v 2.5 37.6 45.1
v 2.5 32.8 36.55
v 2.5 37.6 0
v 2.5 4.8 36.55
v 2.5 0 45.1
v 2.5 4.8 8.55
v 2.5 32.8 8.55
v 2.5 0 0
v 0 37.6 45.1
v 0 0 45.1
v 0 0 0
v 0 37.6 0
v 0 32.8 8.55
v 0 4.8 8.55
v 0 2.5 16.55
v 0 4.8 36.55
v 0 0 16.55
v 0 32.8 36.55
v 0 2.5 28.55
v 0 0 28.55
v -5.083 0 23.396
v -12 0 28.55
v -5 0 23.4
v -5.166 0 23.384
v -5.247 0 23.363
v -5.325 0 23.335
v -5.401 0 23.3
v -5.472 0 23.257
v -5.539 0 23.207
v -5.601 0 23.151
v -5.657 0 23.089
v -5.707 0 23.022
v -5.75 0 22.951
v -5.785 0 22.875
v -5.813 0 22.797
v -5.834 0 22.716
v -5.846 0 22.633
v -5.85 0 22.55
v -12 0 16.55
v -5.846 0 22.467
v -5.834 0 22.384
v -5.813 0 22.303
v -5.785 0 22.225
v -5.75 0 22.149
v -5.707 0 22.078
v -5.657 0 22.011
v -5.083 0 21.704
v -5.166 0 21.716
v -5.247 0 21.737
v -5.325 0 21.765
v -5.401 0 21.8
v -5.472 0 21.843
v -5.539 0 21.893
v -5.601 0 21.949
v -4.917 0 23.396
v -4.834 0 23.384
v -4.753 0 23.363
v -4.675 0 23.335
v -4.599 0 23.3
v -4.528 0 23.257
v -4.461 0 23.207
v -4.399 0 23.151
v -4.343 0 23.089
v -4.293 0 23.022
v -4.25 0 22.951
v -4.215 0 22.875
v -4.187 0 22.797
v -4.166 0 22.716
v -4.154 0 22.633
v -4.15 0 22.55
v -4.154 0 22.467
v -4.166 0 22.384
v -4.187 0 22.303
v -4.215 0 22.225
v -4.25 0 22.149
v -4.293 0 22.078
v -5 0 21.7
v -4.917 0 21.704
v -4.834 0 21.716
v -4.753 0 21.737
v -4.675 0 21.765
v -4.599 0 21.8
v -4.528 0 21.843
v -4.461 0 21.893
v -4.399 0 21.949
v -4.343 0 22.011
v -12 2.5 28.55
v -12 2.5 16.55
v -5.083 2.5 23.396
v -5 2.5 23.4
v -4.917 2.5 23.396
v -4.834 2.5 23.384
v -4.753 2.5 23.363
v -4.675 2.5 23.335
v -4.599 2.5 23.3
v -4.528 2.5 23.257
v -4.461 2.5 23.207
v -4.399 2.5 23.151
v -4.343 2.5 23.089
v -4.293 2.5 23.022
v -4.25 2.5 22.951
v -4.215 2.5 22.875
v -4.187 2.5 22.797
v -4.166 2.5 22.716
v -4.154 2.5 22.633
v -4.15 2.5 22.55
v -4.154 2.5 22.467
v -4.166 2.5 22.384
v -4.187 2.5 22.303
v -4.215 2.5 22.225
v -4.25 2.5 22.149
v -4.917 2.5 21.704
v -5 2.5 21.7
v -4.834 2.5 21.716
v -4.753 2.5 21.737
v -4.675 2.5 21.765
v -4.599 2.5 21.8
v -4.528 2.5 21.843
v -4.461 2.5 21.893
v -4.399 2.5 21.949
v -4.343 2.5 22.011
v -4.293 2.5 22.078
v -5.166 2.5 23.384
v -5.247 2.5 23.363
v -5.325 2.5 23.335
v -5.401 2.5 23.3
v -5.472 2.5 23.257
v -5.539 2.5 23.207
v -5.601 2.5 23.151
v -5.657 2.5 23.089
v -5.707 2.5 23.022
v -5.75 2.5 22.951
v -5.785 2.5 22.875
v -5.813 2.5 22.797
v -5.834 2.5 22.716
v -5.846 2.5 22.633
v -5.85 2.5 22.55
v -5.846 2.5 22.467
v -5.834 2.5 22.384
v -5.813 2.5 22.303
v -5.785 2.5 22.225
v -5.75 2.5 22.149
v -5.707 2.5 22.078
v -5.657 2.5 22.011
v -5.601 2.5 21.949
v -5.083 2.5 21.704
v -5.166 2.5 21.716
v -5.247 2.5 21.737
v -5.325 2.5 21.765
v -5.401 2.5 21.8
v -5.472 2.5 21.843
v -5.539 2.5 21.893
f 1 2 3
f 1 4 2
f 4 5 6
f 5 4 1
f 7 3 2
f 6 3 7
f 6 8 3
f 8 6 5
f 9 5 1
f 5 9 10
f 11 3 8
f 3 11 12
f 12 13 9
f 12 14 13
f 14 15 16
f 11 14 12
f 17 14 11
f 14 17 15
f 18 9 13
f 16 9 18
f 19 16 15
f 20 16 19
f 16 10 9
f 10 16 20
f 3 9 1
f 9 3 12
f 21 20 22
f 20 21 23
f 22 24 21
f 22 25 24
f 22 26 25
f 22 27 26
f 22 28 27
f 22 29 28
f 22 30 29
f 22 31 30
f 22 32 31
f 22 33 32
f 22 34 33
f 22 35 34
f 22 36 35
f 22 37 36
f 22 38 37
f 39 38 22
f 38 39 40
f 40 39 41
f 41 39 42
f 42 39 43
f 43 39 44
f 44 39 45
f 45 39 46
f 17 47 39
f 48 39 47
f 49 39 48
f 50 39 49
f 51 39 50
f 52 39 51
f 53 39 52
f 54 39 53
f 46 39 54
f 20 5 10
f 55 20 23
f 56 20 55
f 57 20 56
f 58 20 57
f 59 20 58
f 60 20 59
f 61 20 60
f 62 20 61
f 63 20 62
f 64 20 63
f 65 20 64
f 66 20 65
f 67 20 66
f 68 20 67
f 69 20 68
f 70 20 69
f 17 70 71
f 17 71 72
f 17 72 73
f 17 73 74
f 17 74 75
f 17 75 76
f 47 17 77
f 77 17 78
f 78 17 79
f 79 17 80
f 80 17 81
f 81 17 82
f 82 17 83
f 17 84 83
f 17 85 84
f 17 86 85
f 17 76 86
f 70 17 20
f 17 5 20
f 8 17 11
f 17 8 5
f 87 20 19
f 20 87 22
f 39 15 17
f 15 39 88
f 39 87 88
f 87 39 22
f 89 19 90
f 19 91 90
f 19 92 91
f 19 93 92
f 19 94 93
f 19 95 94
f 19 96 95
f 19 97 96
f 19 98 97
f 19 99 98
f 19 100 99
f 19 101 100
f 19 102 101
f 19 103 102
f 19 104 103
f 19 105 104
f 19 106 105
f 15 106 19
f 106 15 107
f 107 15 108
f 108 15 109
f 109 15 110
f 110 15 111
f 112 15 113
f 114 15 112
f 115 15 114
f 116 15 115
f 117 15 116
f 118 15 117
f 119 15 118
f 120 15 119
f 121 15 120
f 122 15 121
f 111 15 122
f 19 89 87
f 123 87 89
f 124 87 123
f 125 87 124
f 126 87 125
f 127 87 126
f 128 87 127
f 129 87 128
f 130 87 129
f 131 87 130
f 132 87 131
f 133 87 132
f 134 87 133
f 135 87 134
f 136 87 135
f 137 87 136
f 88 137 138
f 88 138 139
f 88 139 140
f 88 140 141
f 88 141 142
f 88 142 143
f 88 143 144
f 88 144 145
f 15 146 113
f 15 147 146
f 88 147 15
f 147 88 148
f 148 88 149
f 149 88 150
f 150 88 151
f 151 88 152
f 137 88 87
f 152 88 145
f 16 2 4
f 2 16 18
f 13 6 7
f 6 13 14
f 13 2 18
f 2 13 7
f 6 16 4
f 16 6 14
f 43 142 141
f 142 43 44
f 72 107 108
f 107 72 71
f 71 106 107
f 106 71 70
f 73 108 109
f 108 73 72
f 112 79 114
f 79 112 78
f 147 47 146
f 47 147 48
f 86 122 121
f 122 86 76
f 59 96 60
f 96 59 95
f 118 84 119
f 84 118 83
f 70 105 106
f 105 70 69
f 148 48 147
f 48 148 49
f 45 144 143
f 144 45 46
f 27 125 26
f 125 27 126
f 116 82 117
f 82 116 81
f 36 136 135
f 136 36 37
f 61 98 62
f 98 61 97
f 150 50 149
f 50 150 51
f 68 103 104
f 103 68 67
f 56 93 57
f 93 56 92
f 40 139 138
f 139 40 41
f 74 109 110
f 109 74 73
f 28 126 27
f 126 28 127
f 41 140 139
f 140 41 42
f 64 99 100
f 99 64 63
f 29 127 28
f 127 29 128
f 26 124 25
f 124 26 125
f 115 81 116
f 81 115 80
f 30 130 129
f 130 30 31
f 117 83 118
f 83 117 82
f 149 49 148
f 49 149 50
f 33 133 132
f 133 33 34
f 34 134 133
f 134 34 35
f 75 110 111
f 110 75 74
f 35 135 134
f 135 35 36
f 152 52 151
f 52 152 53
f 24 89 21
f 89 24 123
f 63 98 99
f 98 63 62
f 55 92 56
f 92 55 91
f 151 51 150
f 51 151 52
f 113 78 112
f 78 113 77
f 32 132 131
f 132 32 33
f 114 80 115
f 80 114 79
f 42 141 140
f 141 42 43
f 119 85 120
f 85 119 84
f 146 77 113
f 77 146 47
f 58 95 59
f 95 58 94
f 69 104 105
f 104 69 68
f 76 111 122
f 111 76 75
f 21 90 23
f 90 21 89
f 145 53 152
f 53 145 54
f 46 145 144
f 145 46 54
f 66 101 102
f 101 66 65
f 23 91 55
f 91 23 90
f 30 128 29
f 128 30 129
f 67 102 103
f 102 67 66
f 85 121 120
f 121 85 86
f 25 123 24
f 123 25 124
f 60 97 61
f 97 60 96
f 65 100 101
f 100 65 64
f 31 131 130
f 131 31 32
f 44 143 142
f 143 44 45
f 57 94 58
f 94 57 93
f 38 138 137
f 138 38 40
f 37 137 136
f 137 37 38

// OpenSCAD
// file: lib.scad
// Small helpers shared by the parts.

module rounded_square(w, h, r) {
  r2 = min(r, w / 2 - 0.01, h / 2 - 0.01);
  offset(r = r2) square([w - 2 * r2, h - 2 * r2], center = true);
}

// A plate in the x-z plane between y = y0 and y = y0 + t, from a 2D shape drawn in (x, z).
module xz_plate(y0, t) {
  translate([0, y0 + t, 0]) rotate([90, 0, 0]) linear_extrude(t) children();
}

// A plate in the y-z plane between x = x0 and x = x0 + t, from a 2D shape drawn in (y, z).
module yz_plate(x0, t) {
  translate([x0, 0, 0]) rotate([90, 0, 90]) linear_extrude(t) children();
}

// A round hole along x whose top is pointed (45 degrees, cut flat 1 mm above the circle) toward
// +dir so it prints without supports when that axis points up: dir = "y" or "z".
module teardrop_x(d, len, dir = "y") {
  rotate([0, 90, 0]) linear_extrude(len, center = true)
    rotate([0, 0, dir == "y" ? 90 : 0])  // 2D +x below ends up along +dir
      intersection() {
        union() {
          circle(d = d);
          rotate([0, 0, -45]) square(d / 2); // the point, toward 2D +x
        }
        translate([-d, -d]) square([2 * d, 2 * d]);
        translate([-d, -d]) square([d / 2 + 1 + d, 2 * d]);
      }
}
// file: params.scad
// Shared dimensions for the DIY "Reality is yours" glasses. Everything is in mm.
// Wearer coordinates: x = to the wearer's right (+), y = forward toward the world (+), z = up (+).
// The frame front sits between y = 0 (back face, toward the eyes) and y = frame_t; the eyes are
// ~14 mm behind y = 0; the right eye's axis is the line x = ipd/2, z = 0.
//
// Measure your own parts and change these before printing. The ones you should check are marked
// MEASURE; the rest are design choices.

$fn = 64;
clear = 0.3;          // fit clearance for parts that slide into each other (tune for your printer)
m2_hole = 2.2;        // through hole for an M2 screw
m2_tap = 1.7;         // hole an M2 screw self-taps into (plastic)

// ---- face ----
ipd = 63;             // MEASURE: your pupil distance (a ruler in a mirror, or an optician's number)
frame_half_w = 71;    // half the frame width; the temples sit at +-frame_half_w (MEASURE: head width / 2 at the temples, minus 2)
frame_t = 5;          // frame thickness (front to back)

// ---- rims (open; no lenses) ----
rim_w = 40;           // opening width
rim_h = 32;           // opening height
rim_cx = ipd / 2 + 4; // rim center (x): a little outboard of the pupil, as in ordinary glasses
rim_bar = 4.5;        // rim border width
rim_r = 8;            // opening corner radius
rim_outer_w = rim_w + 2 * rim_bar;
rim_outer_h = rim_h + 2 * rim_bar;
bridge_gap = 2 * rim_cx - rim_outer_w;  // space between the rims at the nose (the bridge spans it)
nose_top_w = 16;      // nose notch width at its top (z = nose_top_z)
nose_top_z = 2;
nose_bot_w = 26;      // and at the bottom edge of the frame

// ---- nose pads (printed on the back of the frame) ----
pad_depth = 9;        // how far the pads reach back toward the face
pad_z = -12;          // pad height relative to the eye line

// ---- temples ----
temple_t = 4;         // thickness (x)
temple_h = 10;        // height (z) at the front
temple_z = 8;         // temple centerline height (z)
temple_len = 112;     // straight part, from the frame back face to the ear (MEASURE: frame to the top of your ear)
temple_drop_len = 34; // part that bends down behind the ear
temple_drop_deg = 32;
joint_len = 14;       // how far the frame's joint block reaches back
joint_w = 5;          // joint block width (x)
joint_holes_y = [-4.5, -10.5]; // M2 screw positions along the joint (y)

// ---- wire channel (battery on the left temple -> electronics on the right) ----
wire_w = 2.6;
wire_d = 2;

// ---- optics: OLED -> lens -> 45 degree beam splitter -> right eye ----
// The display faces the nose (-x) on the outer side of the right eye; the splitter in front of the
// eye reflects it back toward the eye (-y) while the world shows through it. One reflection mirrors
// the picture left-right: the firmware flips it (MIRROR_X in config.h).
lens_d = 25;              // MEASURE: lens diameter (Google Cardboard lenses are 25 mm, f ~45 mm)
split_y = frame_t + 2 + lens_d / 2 + 1.5; // optical axis (y): splitter center, lens center, display center
split_w = 25.4;           // MEASURE: beam splitter plate width (the 45 degree side)
split_h = 25.4;           // MEASURE: plate height
split_t = 1.1;            // MEASURE: plate thickness
lens_f = 45;              // MEASURE: lens focal length
lens_edge = 3.5;          // MEASURE: lens edge thickness
lens_gap = 14;            // splitter center -> lens center (x)
// Display -> lens distance: a bit under the focal length puts the picture ~1 m away. The display
// carrier slides +-6 mm around this for focusing.
disp_dist = lens_f * 1000 / (lens_f + 1000);
disp_pcb_w = 44.5;        // MEASURE: display module PCB width (horizontal, along y)
disp_pcb_h = 37.0;        // MEASURE: display module PCB height (z)
disp_pcb_t = 1.6;
disp_active = 27.0;       // MEASURE: visible area (square, 1.5" 128x128 SSD1351)
disp_active_dy = 0;       // MEASURE: visible area center offset from the PCB center (y)
disp_active_dz = 0;       // MEASURE: visible area center offset from the PCB center (z)
disp_parts_t = 5;         // MEASURE: tallest part on the back of the display PCB (pin header etc.)

// ---- lens housing (in front of the right eye; screws to the frame front) ----
wall = 2;
house_x0 = ipd / 2 - split_w / (2 * sqrt(2)) - 2.5 - wall; // nose-side wall
lens_x = ipd / 2 + lens_gap;                     // lens center (x)
house_y0 = frame_t;                              // sits on the frame front
house_y1 = split_y + max(split_w / (2 * sqrt(2)) + 3, lens_d / 2 + 3.4); // front edge
house_hz = rim_outer_h / 2;                      // half height (z), same as the rims
join_x = frame_half_w + 2;                       // where the lens housing meets the display box
lens_plate_t = lens_edge + 3;                    // lens plate thickness (x): 1.5 mm lip + lens + 1.5 mm ring
light_hole = 28;                                 // square light opening between housing and display box
// Frame screw positions (x, z) for the lens housing, clear of the light path (|z| > 14 there).
housing_holes = [[frame_half_w - 2.5, 15.5], [frame_half_w - 5, -18], [lens_x, -rim_outer_h / 2 + rim_bar / 2]];
wire_exit_x = frame_half_w - 8;                  // where the wires pass through the frame to the front

// ---- display box (outboard of the frame; the display slides in it to focus) ----
disp_x_nominal = lens_x + disp_dist;  // display glass (x) at nominal focus
focus_travel = 6;                     // +- range of the display carrier
carrier_t = 2.5;
box_x1 = disp_x_nominal + focus_travel + carrier_t + disp_parts_t + 3;
box_hy = disp_pcb_w / 2 + 0.6 + wall; // half depth (y), centered on the optical axis y = split_y
box_hz = disp_pcb_h / 2 + 0.6 + wall; // half height (z)
join_holes = [[house_y0 + 3, house_hz - 3], [house_y1 - 3, house_hz - 3], [house_y0 + 3, -house_hz + 3], [house_y1 - 3, -house_hz + 3]]; // (y, z)

// ---- electronics pod (on top of the display box): XIAO ESP32S3 Sense + MPU-6050 + 2 buttons ----
pod_in_x = 30;       // inside length (x): XIAO stack is 21 x 17.8
pod_in_y = 25;       // inside depth (y)
pod_in_z = 17;       // MEASURE: XIAO ESP32S3 Sense stacked height incl. the camera flex fold (~15)
pod_x1 = box_x1;     // flush with the display box's outer end (open there; the end cap closes both)
pod_x0 = pod_x1 - pod_in_x - wall;
pod_z0 = box_hz;     // sits on the display box
cam_win = 9;         // camera window (the OV2640 module is ~8.5 mm square)
cam_x = pod_x0 + wall + 8; // camera window center (x): the pod end nearest the eye
button_d = 3.6;      // hole for a 6x6 mm tactile button's plunger
usb_w = 10; usb_h = 5; // USB-C opening in the end cap (MEASURE where your XIAO's port lands)

// ---- battery pod (left temple, outer side) ----
bat_l = 31;          // MEASURE: LiPo length incl. protection board (502030 = 30 mm)
bat_w = 21;          // MEASURE: LiPo width (502030 = 20 mm)
bat_t = 5.5;         // MEASURE: LiPo thickness (502030 = 5 mm)
bat_y0 = -22;        // where the pod starts along the temple (y)
switch_l = 8.8;      // slide switch body (SS12D00 = 8.6 x 3.6)
switch_w = 3.8;
// main file
// Small parts. Each is a module; export one at a time with -D 'part="..."' (see export.sh):
//   display_carrier  holds the OLED (glass toward the lens, through the window); slides in the box
//   lens_ring        presses into the lens seat behind the lens
//   light_shield     glue over the open front of the lens housing between the lens and the box
//   end_cap          closes the outer end of the display box and pod (USB-C opening)
//   battery_lid      closes the battery pod on the left temple
// All print flat (as oriented here), no supports.
include <params.scad>
use <lib.scad>

part = "display_carrier";

// Display carrier, drawn in print orientation: an L (plate + tongue) extruded along z.
// In the box: the plate stands across the optical axis with the display glass pressed to its outer
// face (tape or a dab of hot glue on the PCB corners), the tongue lies on the floor toward the lens,
// and an M2 screw from under the box floor, through the slot, holds it at focus.
module display_carrier() {
  in_y = 2 * box_hy - 2 * wall - 2 * clear; // across the box
  in_z = 2 * box_hz - 2 * wall - 2 * clear; // box inside height
  tongue = 12;
  difference() {
    union() {
      cube([carrier_t, in_z, in_y]);                 // plate: x = thickness, y = height (z in the box), z = width (y in the box)
      translate([-tongue, 0, in_y / 2 - 6]) cube([tongue + carrier_t, carrier_t, 12]); // tongue
    }
    // window for the visible area (box y -> part z, box z -> part y)
    translate([-1, in_z / 2 + disp_active_dz - (disp_active + 1) / 2, in_y / 2 + disp_active_dy - (disp_active + 1) / 2])
      cube([carrier_t + 2, disp_active + 1, disp_active + 1]);
    // clamp screw (self-taps into the tongue from below)
    translate([-5, -1, in_y / 2]) rotate([-90, 0, 0]) cylinder(d = m2_tap, h = carrier_t + 2);
  }
}

module lens_ring() {
  difference() {
    cylinder(d = lens_d + 0.4 - 0.15, h = 1.5);
    translate([0, 0, -1]) cylinder(d = lens_d - 4, h = 4);
  }
}

module light_shield() {
  w = join_x - wall - (lens_x + lens_plate_t / 2) + 2; // overlaps both by 1 mm
  translate([0, 0, 0]) cube([w, 2 * house_hz, 1.2]);
}

// End cap, in print orientation (outer face down): the box + pod outline, with a locating lip that
// fits inside both. USB-C opening where the XIAO's port lands (pod floor + ~2.4 mm).
module end_cap() {
  lip = 1.6;
  module outline(inset) {
    translate([split_y - box_hy + inset, -box_hz + inset]) square([2 * box_hy - 2 * inset, 2 * box_hz - 2 * inset]);
    translate([split_y - pod_in_y / 2 - wall + inset, box_hz - 0.01 - (inset > 0 ? wall : 0)])
      square([pod_in_y + 2 * wall - 2 * inset, pod_in_z + wall + 0.01 - inset + (inset > 0 ? wall : 0)]);
  }
  difference() {
    union() {
      linear_extrude(1.6) outline(0);
      linear_extrude(1.6 + lip) difference() { outline(wall + clear); offset(r = -1.2) outline(wall + clear); }
    }
    translate([split_y, box_hz + 2.4, 0]) linear_extrude(10, center = true) rounded_square(usb_w, usb_h, 2);
  }
}

module battery_lid() {
  cube([bat_l + 1 + 2 * wall, bat_w + 0.6 + 2 * wall, 1.2]);
}

if (part == "display_carrier") display_carrier();
if (part == "lens_ring") lens_ring();
if (part == "light_shield") light_shield();
if (part == "end_cap") end_cap();
if (part == "battery_lid") battery_lid();
